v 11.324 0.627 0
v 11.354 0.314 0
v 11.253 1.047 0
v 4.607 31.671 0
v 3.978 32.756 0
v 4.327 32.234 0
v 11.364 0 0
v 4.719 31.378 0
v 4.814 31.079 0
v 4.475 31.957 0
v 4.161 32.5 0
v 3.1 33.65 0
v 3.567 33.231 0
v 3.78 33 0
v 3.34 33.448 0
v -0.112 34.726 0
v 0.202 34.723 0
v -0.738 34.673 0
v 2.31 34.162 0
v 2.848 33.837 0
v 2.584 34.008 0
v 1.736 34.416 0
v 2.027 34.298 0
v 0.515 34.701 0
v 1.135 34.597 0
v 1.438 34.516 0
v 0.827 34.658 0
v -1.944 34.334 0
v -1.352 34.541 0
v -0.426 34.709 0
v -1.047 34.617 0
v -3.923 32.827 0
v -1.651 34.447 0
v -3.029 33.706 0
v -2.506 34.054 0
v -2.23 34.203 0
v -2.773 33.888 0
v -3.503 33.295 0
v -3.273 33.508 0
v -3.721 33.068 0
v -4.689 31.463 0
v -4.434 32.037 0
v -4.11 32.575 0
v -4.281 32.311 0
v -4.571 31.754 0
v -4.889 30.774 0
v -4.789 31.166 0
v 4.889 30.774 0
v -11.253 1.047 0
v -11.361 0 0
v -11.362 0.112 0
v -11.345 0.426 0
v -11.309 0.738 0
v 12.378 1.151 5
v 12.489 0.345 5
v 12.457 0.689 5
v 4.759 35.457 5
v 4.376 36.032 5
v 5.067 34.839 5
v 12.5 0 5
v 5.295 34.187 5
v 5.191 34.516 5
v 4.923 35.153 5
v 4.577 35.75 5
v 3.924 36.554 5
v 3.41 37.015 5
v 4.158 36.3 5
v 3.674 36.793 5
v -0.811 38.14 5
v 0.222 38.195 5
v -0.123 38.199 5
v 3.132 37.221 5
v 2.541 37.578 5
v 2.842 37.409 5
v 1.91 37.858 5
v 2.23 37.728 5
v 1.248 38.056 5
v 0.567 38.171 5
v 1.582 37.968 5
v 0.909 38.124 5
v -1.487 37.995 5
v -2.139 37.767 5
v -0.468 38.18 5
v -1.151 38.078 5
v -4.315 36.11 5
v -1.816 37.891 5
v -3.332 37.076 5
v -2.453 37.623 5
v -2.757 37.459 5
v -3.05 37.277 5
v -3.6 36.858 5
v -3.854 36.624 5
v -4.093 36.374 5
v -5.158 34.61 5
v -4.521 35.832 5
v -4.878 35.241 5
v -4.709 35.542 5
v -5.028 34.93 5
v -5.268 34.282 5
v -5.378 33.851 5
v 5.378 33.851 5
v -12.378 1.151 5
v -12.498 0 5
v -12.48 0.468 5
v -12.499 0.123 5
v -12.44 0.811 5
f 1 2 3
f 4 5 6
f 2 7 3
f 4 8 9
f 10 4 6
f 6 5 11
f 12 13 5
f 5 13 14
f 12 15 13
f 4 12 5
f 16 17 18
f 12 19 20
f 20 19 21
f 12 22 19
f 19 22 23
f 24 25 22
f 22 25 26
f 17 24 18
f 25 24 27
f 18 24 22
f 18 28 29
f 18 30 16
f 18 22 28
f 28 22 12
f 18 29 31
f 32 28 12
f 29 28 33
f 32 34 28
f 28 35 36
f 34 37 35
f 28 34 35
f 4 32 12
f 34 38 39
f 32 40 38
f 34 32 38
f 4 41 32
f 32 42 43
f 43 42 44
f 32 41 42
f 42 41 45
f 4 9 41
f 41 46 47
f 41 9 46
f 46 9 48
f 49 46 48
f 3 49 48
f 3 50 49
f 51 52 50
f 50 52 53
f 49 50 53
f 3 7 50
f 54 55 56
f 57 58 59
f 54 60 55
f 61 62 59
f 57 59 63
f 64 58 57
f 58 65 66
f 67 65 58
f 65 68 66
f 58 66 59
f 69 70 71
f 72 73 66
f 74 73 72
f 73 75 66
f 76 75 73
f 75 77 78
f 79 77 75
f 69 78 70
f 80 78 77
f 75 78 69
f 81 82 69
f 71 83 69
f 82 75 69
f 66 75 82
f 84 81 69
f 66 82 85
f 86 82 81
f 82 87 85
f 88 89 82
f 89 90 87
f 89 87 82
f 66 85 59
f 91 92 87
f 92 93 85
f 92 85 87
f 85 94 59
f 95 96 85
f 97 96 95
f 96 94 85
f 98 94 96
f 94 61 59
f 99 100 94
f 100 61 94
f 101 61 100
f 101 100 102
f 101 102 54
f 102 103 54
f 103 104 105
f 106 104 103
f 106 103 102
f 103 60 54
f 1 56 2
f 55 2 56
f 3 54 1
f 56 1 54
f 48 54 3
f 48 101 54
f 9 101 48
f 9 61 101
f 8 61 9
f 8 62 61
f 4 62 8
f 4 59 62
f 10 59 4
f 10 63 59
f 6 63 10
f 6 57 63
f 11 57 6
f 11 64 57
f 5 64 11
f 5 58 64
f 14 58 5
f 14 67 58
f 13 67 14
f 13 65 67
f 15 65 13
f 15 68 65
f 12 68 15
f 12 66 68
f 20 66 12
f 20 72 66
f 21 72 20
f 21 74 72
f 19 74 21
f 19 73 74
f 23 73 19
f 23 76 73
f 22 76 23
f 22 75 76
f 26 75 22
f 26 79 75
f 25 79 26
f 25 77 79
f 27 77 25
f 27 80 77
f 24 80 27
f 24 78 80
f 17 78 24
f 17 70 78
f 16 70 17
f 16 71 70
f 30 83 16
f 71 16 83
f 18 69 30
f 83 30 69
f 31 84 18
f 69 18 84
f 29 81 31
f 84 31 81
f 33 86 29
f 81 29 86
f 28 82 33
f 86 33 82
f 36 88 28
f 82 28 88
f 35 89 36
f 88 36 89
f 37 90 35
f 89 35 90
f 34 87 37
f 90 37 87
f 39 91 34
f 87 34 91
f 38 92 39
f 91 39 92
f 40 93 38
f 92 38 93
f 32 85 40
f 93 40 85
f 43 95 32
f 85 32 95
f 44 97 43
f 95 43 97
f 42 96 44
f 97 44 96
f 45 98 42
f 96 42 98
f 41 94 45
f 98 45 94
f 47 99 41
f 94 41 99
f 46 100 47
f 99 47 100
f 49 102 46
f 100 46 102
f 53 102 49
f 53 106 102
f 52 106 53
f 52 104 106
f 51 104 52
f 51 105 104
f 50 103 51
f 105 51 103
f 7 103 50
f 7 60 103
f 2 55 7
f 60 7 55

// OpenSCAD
// file: functions.scad
function fretDistance(fret, scaleLength) =
    scaleLength - scaleLength / pow(2, fret / 12);

function lerp(a, b, x) =
    a + (b - a) * x;
// file: config.scad
use <functions.scad>;

$fn = 100;

// Body
// ----

// X, Y, Roundness
bodyTop = [0, 170, 40];
bodyBottom = [0, -60, 60];
lowerBout = [85, 0, 30];
upperBout = [65, 130, 30];
waist = [55, 80, 30];

bodyLength = [bodyTop[1] - bodyBottom[1]];
maxBodyWidth = [2 * lowerBout[2]];
bodyDepth = 50;

soundboardThickness = 1.8;
backThickness = 1.8;
sideThickness = 1.8;

sideDepth = bodyDepth - backThickness - soundboardThickness;

// Kerf
// ----

useKerf = true;
kerfWidth = 5;
kerfHeight = 10;

// Neck
// ----

neckWidthNarrow = 35;
neckWidthWide = 45;
neckDepthNarrow = 10;
neckDepthWide = 16;

// Heel
// ----

heelWidth = 10;
heelLength = 30;

// Heel Block
// ----------

heelBlockWidth = 30;
heelBlockDepth = 10;

// Heel Dovetail
// -------------

heelDovetailWidth = neckWidthWide - 20;
heelDovetailHeight = sideDepth + soundboardThickness - 10;
heelDovetailDepth = 10;
heelDovetailOffset = 5;
heelDovetailTaper = 1.1;

// Nut
// ---

nutWidth = 4;

pinHeight = 3;
pinRadius = 0.75;
stringSpacing = 9.525;

// Fingerboard
// -----------

scaleLength = 340;
numberOfFrets = 16;

fretWidth = 1.35;
fretDepth = 0.94;
maxFretLength = neckWidthWide;

fingerboardLength = fretDistance(numberOfFrets, scaleLength) + fretWidth + nutWidth;
maxFingerboardWidth = neckWidthWide;
fingerboardDepth = 6;

fingerboardSlopeRadius = 1;

fretFileAngle = 70;

// Beziers
// -------
topUpperBoutBezier = [
    [bodyTop[0], bodyTop[1]],
    [bodyBottom[0] + bodyTop[2], bodyTop[1]],
    [upperBout[0], upperBout[1] + upperBout[2]],
    [upperBout[0], upperBout[1]],
];

upperBoutWaistBezier = [
    [upperBout[0], upperBout[1]],
    [upperBout[0], upperBout[1] - upperBout[2]],
    [waist[0], waist[1] + waist[2]],
    [waist[0], waist[1]]
];

waistLowerBoutBezier = [
    [waist[0], waist[1]],
    [waist[0], waist[1] - waist[2]],
    [lowerBout[0], lowerBout[1] + lowerBout[2]],
    [lowerBout[0], lowerBout[1]]
];

lowerBoutBottomBezier = [
    [lowerBout[0], lowerBout[1]],
    [lowerBout[0], lowerBout[1] - lowerBout[2]],
    [bodyBottom[0] + bodyBottom[2], bodyBottom[1]],
    [bodyBottom[0], bodyBottom[1]]
];
// main file
include <config.scad>;

module dovetail(width, height, depth, offset, taper) {
    linear_extrude(offset, scale=[taper, taper])
        difference() {
            offset(r=offset) {
                polygon([[-width / (2 * taper) + offset, 0],
                         [0, height / taper - offset], [width/ (2 * taper) - offset, 0]]);
            };
            // Doubled offset removes (rounding?) artifact
            translate([-width / 2, 0, 0])
                scale([width, 2 * offset, 1])
                    mirror([0, 1, 0])
                        square(1);
        }
}

dovetail(heelDovetailWidth, heelDovetailHeight, heelDovetailDepth,
         heelDovetailOffset, 1.1);
